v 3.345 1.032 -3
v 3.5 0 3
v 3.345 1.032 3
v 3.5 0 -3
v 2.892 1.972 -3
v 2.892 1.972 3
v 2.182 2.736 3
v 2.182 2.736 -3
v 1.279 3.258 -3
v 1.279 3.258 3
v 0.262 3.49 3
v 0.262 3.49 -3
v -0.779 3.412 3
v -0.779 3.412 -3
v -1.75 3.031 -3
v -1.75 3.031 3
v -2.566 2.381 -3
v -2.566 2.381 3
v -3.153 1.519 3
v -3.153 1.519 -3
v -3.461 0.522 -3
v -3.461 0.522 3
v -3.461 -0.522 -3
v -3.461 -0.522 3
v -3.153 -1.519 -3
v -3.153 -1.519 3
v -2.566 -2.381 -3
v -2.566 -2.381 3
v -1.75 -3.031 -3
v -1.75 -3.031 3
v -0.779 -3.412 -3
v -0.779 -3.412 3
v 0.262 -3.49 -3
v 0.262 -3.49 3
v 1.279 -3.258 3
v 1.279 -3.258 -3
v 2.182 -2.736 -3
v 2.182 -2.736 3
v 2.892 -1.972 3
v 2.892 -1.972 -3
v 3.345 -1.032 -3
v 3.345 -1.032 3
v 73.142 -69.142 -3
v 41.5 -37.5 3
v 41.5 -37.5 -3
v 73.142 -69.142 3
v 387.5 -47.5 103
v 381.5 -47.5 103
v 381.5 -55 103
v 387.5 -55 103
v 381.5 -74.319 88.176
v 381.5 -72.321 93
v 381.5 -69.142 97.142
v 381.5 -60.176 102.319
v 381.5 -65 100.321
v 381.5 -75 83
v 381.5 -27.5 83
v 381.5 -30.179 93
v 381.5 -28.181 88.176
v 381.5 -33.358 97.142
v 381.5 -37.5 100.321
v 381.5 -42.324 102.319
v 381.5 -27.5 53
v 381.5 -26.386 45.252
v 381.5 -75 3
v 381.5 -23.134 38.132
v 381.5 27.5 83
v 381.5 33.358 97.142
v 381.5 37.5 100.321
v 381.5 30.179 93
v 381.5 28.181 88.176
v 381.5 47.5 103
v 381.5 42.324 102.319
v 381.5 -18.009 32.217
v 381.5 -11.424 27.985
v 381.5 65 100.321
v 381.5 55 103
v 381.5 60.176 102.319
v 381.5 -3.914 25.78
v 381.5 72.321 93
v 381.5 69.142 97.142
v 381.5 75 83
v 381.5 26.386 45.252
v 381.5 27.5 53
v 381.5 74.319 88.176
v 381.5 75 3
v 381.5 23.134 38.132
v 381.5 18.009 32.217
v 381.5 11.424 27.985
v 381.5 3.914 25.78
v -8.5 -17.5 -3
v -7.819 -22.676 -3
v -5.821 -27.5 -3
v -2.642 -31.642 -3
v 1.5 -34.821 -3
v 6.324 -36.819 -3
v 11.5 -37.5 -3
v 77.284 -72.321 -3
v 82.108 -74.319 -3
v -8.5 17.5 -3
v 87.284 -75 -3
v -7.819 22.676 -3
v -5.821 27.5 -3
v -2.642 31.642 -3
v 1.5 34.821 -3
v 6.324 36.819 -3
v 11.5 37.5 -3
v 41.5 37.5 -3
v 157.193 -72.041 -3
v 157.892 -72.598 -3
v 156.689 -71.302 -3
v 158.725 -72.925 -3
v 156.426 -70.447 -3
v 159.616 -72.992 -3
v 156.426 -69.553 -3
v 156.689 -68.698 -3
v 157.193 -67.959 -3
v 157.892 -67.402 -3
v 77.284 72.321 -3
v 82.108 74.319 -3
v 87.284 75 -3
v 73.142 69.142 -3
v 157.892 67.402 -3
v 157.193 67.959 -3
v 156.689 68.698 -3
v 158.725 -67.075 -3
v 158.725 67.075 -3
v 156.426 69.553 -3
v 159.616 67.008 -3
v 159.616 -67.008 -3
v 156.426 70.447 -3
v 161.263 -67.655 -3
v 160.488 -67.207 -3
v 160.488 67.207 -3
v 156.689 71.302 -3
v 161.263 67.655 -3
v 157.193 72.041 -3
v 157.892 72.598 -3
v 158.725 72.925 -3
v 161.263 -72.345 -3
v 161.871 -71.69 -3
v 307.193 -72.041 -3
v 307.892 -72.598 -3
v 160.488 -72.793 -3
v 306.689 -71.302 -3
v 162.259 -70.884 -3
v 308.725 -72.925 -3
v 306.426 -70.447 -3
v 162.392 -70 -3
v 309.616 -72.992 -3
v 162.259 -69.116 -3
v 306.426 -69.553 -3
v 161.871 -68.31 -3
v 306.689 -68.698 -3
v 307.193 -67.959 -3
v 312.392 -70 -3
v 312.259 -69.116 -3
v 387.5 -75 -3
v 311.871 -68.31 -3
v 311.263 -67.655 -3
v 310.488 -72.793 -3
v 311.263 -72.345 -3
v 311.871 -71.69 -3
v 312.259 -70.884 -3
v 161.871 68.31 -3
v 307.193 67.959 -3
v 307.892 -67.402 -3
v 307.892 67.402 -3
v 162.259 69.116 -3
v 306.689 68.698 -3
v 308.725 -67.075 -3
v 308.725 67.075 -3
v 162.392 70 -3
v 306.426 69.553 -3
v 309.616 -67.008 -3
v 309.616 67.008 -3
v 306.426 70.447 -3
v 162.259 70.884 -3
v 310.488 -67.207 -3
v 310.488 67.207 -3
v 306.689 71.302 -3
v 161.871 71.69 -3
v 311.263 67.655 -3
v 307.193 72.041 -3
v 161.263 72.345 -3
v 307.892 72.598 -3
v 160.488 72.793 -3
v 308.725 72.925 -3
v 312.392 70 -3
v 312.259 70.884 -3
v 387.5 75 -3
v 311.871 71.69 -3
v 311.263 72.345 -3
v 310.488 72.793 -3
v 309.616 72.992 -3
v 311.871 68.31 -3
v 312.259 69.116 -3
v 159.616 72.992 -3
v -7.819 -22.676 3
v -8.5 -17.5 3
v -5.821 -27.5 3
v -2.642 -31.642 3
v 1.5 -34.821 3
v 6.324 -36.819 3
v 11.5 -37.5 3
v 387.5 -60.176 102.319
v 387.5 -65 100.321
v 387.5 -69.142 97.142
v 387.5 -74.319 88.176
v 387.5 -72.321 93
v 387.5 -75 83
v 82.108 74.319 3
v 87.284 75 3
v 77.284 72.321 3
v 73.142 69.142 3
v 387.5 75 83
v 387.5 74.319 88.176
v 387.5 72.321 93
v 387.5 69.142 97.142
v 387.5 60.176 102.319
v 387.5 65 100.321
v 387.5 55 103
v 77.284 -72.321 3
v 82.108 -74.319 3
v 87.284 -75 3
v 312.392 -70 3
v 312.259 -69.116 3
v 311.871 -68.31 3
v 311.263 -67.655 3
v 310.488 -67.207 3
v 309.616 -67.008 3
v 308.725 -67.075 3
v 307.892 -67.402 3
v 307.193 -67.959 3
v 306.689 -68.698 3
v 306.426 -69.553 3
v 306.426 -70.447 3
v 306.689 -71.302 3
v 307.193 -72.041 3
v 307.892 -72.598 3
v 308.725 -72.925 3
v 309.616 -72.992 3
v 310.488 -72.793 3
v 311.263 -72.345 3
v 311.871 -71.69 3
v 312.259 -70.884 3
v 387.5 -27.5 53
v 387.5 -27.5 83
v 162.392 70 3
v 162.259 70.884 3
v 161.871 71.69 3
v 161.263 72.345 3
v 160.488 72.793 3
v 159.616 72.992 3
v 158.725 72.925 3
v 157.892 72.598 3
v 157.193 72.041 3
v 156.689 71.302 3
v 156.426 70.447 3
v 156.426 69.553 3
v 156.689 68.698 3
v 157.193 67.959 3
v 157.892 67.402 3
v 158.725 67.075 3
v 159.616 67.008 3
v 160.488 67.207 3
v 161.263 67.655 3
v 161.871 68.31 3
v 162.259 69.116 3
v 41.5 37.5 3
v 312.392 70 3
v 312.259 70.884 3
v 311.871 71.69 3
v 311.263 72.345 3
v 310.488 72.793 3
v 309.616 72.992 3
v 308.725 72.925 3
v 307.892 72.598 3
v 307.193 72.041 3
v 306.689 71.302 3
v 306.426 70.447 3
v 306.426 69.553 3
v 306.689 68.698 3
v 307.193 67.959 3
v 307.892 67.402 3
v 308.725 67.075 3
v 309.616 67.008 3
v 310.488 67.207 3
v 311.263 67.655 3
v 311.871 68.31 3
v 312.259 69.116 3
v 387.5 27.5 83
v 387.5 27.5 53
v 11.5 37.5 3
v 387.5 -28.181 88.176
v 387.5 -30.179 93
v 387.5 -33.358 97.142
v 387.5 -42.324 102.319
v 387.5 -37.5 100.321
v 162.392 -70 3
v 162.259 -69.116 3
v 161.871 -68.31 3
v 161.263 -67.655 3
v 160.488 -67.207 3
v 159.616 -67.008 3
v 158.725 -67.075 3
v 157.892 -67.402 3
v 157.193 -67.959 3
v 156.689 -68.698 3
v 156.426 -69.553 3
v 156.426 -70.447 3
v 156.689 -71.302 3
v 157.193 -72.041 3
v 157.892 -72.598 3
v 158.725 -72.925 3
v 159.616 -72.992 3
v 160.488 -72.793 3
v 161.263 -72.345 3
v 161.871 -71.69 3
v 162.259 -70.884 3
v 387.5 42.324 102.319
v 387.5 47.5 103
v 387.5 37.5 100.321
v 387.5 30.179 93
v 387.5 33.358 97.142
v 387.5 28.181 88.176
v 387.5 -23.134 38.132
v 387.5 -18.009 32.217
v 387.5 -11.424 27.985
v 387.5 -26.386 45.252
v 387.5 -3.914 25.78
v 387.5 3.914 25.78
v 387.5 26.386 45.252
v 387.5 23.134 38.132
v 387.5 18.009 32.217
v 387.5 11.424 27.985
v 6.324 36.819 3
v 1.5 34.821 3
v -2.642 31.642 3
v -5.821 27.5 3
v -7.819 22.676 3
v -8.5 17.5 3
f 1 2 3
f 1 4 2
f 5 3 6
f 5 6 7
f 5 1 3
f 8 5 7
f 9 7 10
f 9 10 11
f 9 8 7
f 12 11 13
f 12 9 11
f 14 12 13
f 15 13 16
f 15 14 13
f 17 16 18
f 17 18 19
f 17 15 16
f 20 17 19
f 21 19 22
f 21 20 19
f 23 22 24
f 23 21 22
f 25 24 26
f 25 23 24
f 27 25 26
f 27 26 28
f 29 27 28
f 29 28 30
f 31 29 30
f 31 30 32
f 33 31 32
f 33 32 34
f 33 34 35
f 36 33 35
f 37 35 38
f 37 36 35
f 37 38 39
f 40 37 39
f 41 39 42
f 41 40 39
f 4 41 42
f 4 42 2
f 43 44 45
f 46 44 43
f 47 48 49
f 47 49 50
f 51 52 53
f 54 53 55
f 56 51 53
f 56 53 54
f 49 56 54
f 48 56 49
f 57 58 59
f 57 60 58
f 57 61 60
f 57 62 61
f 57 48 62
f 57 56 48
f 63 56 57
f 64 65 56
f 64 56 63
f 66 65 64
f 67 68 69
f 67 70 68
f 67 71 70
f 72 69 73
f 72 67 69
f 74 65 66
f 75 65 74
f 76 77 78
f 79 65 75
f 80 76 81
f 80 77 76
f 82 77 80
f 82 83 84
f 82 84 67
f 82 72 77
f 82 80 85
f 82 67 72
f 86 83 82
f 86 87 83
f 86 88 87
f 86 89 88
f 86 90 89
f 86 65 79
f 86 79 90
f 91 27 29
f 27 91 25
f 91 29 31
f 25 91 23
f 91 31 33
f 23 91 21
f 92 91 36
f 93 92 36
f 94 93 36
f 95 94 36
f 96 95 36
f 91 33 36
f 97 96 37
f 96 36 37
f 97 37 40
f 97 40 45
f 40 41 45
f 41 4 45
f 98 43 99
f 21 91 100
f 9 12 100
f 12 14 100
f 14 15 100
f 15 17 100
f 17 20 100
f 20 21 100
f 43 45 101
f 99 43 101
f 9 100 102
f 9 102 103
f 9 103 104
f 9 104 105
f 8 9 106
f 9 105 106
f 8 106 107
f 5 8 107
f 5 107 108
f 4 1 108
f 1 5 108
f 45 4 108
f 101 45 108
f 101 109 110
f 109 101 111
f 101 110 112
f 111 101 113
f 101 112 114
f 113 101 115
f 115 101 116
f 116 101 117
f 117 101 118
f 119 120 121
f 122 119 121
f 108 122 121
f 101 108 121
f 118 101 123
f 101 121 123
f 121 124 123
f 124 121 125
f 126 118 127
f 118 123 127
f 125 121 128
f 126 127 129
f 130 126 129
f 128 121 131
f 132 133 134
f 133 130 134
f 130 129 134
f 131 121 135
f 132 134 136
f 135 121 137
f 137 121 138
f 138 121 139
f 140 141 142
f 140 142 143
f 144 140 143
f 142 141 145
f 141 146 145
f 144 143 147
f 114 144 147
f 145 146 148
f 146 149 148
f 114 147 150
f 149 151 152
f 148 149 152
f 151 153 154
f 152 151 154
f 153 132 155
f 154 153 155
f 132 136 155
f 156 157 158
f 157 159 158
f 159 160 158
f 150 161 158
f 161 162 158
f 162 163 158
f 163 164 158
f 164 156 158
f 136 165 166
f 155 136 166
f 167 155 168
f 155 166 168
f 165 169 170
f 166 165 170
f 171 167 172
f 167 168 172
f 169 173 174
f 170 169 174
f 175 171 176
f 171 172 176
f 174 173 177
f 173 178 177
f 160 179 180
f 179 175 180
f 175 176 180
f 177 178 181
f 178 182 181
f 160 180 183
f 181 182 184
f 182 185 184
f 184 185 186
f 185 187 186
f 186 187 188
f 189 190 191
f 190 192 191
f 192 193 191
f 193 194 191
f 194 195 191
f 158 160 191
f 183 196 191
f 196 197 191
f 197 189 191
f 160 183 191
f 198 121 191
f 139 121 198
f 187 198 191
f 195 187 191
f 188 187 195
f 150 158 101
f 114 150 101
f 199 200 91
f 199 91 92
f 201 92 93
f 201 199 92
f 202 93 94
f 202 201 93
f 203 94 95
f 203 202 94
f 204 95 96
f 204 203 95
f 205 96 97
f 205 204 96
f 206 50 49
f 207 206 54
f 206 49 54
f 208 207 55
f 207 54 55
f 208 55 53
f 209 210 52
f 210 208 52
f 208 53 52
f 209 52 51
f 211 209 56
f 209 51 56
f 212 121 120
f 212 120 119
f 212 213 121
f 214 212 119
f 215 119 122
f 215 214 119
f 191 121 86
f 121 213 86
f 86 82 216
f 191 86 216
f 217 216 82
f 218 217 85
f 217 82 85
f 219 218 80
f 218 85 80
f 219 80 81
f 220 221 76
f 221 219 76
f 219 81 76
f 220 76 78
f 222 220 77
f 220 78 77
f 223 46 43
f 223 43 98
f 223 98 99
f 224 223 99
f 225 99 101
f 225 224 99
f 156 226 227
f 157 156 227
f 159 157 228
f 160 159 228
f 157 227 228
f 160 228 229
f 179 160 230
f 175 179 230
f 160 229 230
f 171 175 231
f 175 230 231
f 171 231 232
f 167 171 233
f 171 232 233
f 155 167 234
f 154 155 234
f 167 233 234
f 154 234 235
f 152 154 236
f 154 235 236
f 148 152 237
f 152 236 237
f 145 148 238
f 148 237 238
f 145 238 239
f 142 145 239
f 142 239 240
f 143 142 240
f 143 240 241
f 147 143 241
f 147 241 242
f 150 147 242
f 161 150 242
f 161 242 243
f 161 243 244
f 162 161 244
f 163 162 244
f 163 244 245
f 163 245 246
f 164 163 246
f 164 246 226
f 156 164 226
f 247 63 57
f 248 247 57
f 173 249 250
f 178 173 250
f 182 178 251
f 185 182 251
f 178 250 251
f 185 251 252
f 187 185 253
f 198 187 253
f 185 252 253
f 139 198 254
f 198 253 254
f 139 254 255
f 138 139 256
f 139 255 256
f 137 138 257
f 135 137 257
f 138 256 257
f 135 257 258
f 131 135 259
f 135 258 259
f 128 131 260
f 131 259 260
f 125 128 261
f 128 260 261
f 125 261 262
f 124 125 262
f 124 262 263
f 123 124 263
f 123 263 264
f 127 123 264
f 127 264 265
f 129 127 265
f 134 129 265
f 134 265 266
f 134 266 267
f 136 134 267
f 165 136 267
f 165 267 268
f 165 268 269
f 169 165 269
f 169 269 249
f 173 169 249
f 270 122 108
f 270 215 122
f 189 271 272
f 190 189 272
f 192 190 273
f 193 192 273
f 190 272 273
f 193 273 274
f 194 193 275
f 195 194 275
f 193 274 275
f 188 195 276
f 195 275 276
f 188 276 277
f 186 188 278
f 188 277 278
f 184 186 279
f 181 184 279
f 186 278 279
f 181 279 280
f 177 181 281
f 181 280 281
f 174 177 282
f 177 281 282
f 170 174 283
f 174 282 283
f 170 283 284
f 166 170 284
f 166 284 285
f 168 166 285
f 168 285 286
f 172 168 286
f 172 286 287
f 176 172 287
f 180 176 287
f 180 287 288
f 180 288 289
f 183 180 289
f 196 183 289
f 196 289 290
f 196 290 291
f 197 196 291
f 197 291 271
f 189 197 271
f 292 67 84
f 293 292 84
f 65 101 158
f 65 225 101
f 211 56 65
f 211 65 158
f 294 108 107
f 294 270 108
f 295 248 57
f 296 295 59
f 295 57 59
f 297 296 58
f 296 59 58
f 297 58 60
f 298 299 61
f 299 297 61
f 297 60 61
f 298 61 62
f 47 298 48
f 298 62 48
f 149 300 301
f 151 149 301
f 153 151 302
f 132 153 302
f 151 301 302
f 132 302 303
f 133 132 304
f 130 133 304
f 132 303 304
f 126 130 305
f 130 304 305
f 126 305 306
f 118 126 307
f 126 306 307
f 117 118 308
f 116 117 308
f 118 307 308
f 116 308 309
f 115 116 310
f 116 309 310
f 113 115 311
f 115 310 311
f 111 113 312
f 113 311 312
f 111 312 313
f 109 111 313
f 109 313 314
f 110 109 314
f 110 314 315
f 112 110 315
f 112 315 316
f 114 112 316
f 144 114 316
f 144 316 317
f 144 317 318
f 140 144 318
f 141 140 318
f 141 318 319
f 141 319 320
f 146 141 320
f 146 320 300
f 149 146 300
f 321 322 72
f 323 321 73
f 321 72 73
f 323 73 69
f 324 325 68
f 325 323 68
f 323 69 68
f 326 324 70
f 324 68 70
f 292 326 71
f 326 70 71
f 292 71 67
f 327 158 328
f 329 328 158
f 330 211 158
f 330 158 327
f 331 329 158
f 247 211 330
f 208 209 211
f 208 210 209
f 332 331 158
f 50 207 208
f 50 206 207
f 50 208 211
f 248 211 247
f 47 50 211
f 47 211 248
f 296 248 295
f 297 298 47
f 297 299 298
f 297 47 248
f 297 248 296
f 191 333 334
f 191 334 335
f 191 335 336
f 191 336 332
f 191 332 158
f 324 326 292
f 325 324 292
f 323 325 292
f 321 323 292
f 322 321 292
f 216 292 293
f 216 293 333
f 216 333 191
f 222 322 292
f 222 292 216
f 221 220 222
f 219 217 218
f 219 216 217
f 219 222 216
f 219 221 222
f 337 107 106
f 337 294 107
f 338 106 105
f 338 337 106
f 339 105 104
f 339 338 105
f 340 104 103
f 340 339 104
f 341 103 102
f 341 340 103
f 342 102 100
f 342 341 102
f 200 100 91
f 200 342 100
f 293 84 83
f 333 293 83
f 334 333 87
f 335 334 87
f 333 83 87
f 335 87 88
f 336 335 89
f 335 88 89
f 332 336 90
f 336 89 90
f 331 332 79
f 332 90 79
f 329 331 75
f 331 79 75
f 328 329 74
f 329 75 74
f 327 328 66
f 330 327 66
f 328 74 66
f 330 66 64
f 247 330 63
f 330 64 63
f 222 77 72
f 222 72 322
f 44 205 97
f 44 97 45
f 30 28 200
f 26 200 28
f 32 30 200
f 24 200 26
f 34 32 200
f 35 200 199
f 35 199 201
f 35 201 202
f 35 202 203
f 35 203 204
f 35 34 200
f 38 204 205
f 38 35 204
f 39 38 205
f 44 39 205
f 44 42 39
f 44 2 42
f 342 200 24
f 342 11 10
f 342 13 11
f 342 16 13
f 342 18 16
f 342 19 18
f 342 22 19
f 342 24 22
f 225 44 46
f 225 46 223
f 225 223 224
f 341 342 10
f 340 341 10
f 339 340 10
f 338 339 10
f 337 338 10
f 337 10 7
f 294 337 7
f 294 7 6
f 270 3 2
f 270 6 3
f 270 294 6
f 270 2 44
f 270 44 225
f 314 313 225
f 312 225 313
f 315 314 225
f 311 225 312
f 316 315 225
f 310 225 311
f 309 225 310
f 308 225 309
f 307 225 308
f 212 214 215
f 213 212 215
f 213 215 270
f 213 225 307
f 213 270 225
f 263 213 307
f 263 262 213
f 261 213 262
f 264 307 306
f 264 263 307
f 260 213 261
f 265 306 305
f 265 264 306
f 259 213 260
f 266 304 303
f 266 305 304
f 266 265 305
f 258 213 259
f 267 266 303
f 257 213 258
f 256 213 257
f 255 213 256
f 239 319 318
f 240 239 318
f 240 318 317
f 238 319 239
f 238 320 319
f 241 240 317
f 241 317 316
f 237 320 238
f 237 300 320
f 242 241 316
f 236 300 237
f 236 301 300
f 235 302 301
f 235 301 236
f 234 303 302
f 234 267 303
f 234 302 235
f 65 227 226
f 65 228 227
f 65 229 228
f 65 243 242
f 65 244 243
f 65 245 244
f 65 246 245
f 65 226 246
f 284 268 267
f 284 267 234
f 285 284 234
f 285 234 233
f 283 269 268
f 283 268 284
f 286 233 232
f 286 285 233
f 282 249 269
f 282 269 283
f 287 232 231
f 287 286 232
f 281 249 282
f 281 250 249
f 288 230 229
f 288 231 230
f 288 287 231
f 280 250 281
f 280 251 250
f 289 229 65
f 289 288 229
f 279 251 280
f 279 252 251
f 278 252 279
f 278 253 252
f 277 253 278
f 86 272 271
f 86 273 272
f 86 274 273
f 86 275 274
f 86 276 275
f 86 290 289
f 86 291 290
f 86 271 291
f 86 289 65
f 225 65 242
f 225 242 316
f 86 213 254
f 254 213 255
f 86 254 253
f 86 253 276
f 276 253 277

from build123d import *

# Parameters (mm, degrees)
F0_R          = 3.5
F1_DEPTH      = 3
F0_W          = 6
F0_H          = 150
F2_DEPTH      = 103
F2_DEPTH_BACK = 3
F4_DEPTH      = 25
F5_R          = 3
F6_DEPTH      = 25


with BuildPart() as f1:
    # F0 (on Top) → F1 (new body, symmetric)
    with BuildSketch(Plane.XY):
        with BuildLine():
            Line((-8.5, 17.5), (-8.5, 0))
            Line((-8.5, 0), (-8.5, -17.5))
            ThreePointArc((-8.5, -17.5), (-2.642136, -31.642136), (11.5, -37.5))
            Line((11.5, -37.5), (41.5, -37.5))
            Line((41.5, -37.5), (73.142136, -69.142136))
            ThreePointArc((73.142136, -69.142136), (79.630603, -73.477591), (87.284271, -75))
            Line((87.284271, -75), (381.5, -75))
            Line((381.5, -75), (381.5, 75))
            Line((381.5, 75), (87.284271, 75))
            ThreePointArc((87.284271, 75), (79.630603, 73.477591), (73.142136, 69.142136))
            Line((73.142136, 69.142136), (41.5, 37.5))
            Line((41.5, 37.5), (11.5, 37.5))
            ThreePointArc((11.5, 37.5), (-2.642136, 31.642136), (-8.5, 17.5))
        make_face()
        Circle(F0_R, mode=Mode.SUBTRACT)
    extrude(amount=F1_DEPTH, both=True)

    # F0 (on Top) → F2 (join, two sides)
    with BuildSketch(Plane.XY) as f2_sk:
        with Locations((384.5, 0)):
            Rectangle(F0_W, F0_H)
    extrude(amount=F2_DEPTH)
    extrude(f2_sk.sketch, amount=-F2_DEPTH_BACK)

    # F3 (on face) → F4 (cut)
    with BuildSketch(Plane(origin=(381.5, 0, 0), x_dir=(0, -1, 0), z_dir=(-1, 0, 0))):
        with BuildLine():
            ThreePointArc((27.5, 53), (0, 80.5), (-27.5, 53))
            ThreePointArc((-27.5, 53), (0, 25.5), (27.5, 53))
        make_face()
        with BuildLine():
            ThreePointArc((55, 103), (69.142136, 97.142136), (75, 83))
            Line((75, 83), (75, 103))
            Line((75, 103), (55, 103))
        make_face()
        with BuildLine():
            Line((-75, 103), (-75, 83))
            ThreePointArc((-75, 83), (-69.142136, 97.142136), (-55, 103))
            Line((-55, 103), (-75, 103))
        make_face()
        with BuildLine():
            Line((-27.5, 103), (-47.5, 103))
            ThreePointArc((-47.5, 103), (-33.357864, 97.142136), (-27.5, 83))
            Line((-27.5, 83), (-27.5, 53))
            ThreePointArc((-27.5, 53), (0, 80.5), (27.5, 53))
            Line((27.5, 53), (27.5, 83))
            ThreePointArc((27.5, 83), (33.357864, 97.142136), (47.5, 103))
            Line((47.5, 103), (32.5, 103))
            Line((32.5, 103), (-27.5, 103))
        make_face()
    extrude(amount=-F4_DEPTH, mode=Mode.SUBTRACT)

    # F5 (on face) → F6 (cut)
    with BuildSketch(Plane.XY.offset(3)):
        with Locations((159.392136, 70)):
            Circle(F5_R)
        with Locations((309.392136, 70)):
            Circle(F5_R)
        with Locations((309.392136, -70)):
            Circle(F5_R)
        with Locations((159.392136, -70)):
            Circle(F5_R)
    extrude(amount=-F6_DEPTH, mode=Mode.SUBTRACT)


solid = f1.part
